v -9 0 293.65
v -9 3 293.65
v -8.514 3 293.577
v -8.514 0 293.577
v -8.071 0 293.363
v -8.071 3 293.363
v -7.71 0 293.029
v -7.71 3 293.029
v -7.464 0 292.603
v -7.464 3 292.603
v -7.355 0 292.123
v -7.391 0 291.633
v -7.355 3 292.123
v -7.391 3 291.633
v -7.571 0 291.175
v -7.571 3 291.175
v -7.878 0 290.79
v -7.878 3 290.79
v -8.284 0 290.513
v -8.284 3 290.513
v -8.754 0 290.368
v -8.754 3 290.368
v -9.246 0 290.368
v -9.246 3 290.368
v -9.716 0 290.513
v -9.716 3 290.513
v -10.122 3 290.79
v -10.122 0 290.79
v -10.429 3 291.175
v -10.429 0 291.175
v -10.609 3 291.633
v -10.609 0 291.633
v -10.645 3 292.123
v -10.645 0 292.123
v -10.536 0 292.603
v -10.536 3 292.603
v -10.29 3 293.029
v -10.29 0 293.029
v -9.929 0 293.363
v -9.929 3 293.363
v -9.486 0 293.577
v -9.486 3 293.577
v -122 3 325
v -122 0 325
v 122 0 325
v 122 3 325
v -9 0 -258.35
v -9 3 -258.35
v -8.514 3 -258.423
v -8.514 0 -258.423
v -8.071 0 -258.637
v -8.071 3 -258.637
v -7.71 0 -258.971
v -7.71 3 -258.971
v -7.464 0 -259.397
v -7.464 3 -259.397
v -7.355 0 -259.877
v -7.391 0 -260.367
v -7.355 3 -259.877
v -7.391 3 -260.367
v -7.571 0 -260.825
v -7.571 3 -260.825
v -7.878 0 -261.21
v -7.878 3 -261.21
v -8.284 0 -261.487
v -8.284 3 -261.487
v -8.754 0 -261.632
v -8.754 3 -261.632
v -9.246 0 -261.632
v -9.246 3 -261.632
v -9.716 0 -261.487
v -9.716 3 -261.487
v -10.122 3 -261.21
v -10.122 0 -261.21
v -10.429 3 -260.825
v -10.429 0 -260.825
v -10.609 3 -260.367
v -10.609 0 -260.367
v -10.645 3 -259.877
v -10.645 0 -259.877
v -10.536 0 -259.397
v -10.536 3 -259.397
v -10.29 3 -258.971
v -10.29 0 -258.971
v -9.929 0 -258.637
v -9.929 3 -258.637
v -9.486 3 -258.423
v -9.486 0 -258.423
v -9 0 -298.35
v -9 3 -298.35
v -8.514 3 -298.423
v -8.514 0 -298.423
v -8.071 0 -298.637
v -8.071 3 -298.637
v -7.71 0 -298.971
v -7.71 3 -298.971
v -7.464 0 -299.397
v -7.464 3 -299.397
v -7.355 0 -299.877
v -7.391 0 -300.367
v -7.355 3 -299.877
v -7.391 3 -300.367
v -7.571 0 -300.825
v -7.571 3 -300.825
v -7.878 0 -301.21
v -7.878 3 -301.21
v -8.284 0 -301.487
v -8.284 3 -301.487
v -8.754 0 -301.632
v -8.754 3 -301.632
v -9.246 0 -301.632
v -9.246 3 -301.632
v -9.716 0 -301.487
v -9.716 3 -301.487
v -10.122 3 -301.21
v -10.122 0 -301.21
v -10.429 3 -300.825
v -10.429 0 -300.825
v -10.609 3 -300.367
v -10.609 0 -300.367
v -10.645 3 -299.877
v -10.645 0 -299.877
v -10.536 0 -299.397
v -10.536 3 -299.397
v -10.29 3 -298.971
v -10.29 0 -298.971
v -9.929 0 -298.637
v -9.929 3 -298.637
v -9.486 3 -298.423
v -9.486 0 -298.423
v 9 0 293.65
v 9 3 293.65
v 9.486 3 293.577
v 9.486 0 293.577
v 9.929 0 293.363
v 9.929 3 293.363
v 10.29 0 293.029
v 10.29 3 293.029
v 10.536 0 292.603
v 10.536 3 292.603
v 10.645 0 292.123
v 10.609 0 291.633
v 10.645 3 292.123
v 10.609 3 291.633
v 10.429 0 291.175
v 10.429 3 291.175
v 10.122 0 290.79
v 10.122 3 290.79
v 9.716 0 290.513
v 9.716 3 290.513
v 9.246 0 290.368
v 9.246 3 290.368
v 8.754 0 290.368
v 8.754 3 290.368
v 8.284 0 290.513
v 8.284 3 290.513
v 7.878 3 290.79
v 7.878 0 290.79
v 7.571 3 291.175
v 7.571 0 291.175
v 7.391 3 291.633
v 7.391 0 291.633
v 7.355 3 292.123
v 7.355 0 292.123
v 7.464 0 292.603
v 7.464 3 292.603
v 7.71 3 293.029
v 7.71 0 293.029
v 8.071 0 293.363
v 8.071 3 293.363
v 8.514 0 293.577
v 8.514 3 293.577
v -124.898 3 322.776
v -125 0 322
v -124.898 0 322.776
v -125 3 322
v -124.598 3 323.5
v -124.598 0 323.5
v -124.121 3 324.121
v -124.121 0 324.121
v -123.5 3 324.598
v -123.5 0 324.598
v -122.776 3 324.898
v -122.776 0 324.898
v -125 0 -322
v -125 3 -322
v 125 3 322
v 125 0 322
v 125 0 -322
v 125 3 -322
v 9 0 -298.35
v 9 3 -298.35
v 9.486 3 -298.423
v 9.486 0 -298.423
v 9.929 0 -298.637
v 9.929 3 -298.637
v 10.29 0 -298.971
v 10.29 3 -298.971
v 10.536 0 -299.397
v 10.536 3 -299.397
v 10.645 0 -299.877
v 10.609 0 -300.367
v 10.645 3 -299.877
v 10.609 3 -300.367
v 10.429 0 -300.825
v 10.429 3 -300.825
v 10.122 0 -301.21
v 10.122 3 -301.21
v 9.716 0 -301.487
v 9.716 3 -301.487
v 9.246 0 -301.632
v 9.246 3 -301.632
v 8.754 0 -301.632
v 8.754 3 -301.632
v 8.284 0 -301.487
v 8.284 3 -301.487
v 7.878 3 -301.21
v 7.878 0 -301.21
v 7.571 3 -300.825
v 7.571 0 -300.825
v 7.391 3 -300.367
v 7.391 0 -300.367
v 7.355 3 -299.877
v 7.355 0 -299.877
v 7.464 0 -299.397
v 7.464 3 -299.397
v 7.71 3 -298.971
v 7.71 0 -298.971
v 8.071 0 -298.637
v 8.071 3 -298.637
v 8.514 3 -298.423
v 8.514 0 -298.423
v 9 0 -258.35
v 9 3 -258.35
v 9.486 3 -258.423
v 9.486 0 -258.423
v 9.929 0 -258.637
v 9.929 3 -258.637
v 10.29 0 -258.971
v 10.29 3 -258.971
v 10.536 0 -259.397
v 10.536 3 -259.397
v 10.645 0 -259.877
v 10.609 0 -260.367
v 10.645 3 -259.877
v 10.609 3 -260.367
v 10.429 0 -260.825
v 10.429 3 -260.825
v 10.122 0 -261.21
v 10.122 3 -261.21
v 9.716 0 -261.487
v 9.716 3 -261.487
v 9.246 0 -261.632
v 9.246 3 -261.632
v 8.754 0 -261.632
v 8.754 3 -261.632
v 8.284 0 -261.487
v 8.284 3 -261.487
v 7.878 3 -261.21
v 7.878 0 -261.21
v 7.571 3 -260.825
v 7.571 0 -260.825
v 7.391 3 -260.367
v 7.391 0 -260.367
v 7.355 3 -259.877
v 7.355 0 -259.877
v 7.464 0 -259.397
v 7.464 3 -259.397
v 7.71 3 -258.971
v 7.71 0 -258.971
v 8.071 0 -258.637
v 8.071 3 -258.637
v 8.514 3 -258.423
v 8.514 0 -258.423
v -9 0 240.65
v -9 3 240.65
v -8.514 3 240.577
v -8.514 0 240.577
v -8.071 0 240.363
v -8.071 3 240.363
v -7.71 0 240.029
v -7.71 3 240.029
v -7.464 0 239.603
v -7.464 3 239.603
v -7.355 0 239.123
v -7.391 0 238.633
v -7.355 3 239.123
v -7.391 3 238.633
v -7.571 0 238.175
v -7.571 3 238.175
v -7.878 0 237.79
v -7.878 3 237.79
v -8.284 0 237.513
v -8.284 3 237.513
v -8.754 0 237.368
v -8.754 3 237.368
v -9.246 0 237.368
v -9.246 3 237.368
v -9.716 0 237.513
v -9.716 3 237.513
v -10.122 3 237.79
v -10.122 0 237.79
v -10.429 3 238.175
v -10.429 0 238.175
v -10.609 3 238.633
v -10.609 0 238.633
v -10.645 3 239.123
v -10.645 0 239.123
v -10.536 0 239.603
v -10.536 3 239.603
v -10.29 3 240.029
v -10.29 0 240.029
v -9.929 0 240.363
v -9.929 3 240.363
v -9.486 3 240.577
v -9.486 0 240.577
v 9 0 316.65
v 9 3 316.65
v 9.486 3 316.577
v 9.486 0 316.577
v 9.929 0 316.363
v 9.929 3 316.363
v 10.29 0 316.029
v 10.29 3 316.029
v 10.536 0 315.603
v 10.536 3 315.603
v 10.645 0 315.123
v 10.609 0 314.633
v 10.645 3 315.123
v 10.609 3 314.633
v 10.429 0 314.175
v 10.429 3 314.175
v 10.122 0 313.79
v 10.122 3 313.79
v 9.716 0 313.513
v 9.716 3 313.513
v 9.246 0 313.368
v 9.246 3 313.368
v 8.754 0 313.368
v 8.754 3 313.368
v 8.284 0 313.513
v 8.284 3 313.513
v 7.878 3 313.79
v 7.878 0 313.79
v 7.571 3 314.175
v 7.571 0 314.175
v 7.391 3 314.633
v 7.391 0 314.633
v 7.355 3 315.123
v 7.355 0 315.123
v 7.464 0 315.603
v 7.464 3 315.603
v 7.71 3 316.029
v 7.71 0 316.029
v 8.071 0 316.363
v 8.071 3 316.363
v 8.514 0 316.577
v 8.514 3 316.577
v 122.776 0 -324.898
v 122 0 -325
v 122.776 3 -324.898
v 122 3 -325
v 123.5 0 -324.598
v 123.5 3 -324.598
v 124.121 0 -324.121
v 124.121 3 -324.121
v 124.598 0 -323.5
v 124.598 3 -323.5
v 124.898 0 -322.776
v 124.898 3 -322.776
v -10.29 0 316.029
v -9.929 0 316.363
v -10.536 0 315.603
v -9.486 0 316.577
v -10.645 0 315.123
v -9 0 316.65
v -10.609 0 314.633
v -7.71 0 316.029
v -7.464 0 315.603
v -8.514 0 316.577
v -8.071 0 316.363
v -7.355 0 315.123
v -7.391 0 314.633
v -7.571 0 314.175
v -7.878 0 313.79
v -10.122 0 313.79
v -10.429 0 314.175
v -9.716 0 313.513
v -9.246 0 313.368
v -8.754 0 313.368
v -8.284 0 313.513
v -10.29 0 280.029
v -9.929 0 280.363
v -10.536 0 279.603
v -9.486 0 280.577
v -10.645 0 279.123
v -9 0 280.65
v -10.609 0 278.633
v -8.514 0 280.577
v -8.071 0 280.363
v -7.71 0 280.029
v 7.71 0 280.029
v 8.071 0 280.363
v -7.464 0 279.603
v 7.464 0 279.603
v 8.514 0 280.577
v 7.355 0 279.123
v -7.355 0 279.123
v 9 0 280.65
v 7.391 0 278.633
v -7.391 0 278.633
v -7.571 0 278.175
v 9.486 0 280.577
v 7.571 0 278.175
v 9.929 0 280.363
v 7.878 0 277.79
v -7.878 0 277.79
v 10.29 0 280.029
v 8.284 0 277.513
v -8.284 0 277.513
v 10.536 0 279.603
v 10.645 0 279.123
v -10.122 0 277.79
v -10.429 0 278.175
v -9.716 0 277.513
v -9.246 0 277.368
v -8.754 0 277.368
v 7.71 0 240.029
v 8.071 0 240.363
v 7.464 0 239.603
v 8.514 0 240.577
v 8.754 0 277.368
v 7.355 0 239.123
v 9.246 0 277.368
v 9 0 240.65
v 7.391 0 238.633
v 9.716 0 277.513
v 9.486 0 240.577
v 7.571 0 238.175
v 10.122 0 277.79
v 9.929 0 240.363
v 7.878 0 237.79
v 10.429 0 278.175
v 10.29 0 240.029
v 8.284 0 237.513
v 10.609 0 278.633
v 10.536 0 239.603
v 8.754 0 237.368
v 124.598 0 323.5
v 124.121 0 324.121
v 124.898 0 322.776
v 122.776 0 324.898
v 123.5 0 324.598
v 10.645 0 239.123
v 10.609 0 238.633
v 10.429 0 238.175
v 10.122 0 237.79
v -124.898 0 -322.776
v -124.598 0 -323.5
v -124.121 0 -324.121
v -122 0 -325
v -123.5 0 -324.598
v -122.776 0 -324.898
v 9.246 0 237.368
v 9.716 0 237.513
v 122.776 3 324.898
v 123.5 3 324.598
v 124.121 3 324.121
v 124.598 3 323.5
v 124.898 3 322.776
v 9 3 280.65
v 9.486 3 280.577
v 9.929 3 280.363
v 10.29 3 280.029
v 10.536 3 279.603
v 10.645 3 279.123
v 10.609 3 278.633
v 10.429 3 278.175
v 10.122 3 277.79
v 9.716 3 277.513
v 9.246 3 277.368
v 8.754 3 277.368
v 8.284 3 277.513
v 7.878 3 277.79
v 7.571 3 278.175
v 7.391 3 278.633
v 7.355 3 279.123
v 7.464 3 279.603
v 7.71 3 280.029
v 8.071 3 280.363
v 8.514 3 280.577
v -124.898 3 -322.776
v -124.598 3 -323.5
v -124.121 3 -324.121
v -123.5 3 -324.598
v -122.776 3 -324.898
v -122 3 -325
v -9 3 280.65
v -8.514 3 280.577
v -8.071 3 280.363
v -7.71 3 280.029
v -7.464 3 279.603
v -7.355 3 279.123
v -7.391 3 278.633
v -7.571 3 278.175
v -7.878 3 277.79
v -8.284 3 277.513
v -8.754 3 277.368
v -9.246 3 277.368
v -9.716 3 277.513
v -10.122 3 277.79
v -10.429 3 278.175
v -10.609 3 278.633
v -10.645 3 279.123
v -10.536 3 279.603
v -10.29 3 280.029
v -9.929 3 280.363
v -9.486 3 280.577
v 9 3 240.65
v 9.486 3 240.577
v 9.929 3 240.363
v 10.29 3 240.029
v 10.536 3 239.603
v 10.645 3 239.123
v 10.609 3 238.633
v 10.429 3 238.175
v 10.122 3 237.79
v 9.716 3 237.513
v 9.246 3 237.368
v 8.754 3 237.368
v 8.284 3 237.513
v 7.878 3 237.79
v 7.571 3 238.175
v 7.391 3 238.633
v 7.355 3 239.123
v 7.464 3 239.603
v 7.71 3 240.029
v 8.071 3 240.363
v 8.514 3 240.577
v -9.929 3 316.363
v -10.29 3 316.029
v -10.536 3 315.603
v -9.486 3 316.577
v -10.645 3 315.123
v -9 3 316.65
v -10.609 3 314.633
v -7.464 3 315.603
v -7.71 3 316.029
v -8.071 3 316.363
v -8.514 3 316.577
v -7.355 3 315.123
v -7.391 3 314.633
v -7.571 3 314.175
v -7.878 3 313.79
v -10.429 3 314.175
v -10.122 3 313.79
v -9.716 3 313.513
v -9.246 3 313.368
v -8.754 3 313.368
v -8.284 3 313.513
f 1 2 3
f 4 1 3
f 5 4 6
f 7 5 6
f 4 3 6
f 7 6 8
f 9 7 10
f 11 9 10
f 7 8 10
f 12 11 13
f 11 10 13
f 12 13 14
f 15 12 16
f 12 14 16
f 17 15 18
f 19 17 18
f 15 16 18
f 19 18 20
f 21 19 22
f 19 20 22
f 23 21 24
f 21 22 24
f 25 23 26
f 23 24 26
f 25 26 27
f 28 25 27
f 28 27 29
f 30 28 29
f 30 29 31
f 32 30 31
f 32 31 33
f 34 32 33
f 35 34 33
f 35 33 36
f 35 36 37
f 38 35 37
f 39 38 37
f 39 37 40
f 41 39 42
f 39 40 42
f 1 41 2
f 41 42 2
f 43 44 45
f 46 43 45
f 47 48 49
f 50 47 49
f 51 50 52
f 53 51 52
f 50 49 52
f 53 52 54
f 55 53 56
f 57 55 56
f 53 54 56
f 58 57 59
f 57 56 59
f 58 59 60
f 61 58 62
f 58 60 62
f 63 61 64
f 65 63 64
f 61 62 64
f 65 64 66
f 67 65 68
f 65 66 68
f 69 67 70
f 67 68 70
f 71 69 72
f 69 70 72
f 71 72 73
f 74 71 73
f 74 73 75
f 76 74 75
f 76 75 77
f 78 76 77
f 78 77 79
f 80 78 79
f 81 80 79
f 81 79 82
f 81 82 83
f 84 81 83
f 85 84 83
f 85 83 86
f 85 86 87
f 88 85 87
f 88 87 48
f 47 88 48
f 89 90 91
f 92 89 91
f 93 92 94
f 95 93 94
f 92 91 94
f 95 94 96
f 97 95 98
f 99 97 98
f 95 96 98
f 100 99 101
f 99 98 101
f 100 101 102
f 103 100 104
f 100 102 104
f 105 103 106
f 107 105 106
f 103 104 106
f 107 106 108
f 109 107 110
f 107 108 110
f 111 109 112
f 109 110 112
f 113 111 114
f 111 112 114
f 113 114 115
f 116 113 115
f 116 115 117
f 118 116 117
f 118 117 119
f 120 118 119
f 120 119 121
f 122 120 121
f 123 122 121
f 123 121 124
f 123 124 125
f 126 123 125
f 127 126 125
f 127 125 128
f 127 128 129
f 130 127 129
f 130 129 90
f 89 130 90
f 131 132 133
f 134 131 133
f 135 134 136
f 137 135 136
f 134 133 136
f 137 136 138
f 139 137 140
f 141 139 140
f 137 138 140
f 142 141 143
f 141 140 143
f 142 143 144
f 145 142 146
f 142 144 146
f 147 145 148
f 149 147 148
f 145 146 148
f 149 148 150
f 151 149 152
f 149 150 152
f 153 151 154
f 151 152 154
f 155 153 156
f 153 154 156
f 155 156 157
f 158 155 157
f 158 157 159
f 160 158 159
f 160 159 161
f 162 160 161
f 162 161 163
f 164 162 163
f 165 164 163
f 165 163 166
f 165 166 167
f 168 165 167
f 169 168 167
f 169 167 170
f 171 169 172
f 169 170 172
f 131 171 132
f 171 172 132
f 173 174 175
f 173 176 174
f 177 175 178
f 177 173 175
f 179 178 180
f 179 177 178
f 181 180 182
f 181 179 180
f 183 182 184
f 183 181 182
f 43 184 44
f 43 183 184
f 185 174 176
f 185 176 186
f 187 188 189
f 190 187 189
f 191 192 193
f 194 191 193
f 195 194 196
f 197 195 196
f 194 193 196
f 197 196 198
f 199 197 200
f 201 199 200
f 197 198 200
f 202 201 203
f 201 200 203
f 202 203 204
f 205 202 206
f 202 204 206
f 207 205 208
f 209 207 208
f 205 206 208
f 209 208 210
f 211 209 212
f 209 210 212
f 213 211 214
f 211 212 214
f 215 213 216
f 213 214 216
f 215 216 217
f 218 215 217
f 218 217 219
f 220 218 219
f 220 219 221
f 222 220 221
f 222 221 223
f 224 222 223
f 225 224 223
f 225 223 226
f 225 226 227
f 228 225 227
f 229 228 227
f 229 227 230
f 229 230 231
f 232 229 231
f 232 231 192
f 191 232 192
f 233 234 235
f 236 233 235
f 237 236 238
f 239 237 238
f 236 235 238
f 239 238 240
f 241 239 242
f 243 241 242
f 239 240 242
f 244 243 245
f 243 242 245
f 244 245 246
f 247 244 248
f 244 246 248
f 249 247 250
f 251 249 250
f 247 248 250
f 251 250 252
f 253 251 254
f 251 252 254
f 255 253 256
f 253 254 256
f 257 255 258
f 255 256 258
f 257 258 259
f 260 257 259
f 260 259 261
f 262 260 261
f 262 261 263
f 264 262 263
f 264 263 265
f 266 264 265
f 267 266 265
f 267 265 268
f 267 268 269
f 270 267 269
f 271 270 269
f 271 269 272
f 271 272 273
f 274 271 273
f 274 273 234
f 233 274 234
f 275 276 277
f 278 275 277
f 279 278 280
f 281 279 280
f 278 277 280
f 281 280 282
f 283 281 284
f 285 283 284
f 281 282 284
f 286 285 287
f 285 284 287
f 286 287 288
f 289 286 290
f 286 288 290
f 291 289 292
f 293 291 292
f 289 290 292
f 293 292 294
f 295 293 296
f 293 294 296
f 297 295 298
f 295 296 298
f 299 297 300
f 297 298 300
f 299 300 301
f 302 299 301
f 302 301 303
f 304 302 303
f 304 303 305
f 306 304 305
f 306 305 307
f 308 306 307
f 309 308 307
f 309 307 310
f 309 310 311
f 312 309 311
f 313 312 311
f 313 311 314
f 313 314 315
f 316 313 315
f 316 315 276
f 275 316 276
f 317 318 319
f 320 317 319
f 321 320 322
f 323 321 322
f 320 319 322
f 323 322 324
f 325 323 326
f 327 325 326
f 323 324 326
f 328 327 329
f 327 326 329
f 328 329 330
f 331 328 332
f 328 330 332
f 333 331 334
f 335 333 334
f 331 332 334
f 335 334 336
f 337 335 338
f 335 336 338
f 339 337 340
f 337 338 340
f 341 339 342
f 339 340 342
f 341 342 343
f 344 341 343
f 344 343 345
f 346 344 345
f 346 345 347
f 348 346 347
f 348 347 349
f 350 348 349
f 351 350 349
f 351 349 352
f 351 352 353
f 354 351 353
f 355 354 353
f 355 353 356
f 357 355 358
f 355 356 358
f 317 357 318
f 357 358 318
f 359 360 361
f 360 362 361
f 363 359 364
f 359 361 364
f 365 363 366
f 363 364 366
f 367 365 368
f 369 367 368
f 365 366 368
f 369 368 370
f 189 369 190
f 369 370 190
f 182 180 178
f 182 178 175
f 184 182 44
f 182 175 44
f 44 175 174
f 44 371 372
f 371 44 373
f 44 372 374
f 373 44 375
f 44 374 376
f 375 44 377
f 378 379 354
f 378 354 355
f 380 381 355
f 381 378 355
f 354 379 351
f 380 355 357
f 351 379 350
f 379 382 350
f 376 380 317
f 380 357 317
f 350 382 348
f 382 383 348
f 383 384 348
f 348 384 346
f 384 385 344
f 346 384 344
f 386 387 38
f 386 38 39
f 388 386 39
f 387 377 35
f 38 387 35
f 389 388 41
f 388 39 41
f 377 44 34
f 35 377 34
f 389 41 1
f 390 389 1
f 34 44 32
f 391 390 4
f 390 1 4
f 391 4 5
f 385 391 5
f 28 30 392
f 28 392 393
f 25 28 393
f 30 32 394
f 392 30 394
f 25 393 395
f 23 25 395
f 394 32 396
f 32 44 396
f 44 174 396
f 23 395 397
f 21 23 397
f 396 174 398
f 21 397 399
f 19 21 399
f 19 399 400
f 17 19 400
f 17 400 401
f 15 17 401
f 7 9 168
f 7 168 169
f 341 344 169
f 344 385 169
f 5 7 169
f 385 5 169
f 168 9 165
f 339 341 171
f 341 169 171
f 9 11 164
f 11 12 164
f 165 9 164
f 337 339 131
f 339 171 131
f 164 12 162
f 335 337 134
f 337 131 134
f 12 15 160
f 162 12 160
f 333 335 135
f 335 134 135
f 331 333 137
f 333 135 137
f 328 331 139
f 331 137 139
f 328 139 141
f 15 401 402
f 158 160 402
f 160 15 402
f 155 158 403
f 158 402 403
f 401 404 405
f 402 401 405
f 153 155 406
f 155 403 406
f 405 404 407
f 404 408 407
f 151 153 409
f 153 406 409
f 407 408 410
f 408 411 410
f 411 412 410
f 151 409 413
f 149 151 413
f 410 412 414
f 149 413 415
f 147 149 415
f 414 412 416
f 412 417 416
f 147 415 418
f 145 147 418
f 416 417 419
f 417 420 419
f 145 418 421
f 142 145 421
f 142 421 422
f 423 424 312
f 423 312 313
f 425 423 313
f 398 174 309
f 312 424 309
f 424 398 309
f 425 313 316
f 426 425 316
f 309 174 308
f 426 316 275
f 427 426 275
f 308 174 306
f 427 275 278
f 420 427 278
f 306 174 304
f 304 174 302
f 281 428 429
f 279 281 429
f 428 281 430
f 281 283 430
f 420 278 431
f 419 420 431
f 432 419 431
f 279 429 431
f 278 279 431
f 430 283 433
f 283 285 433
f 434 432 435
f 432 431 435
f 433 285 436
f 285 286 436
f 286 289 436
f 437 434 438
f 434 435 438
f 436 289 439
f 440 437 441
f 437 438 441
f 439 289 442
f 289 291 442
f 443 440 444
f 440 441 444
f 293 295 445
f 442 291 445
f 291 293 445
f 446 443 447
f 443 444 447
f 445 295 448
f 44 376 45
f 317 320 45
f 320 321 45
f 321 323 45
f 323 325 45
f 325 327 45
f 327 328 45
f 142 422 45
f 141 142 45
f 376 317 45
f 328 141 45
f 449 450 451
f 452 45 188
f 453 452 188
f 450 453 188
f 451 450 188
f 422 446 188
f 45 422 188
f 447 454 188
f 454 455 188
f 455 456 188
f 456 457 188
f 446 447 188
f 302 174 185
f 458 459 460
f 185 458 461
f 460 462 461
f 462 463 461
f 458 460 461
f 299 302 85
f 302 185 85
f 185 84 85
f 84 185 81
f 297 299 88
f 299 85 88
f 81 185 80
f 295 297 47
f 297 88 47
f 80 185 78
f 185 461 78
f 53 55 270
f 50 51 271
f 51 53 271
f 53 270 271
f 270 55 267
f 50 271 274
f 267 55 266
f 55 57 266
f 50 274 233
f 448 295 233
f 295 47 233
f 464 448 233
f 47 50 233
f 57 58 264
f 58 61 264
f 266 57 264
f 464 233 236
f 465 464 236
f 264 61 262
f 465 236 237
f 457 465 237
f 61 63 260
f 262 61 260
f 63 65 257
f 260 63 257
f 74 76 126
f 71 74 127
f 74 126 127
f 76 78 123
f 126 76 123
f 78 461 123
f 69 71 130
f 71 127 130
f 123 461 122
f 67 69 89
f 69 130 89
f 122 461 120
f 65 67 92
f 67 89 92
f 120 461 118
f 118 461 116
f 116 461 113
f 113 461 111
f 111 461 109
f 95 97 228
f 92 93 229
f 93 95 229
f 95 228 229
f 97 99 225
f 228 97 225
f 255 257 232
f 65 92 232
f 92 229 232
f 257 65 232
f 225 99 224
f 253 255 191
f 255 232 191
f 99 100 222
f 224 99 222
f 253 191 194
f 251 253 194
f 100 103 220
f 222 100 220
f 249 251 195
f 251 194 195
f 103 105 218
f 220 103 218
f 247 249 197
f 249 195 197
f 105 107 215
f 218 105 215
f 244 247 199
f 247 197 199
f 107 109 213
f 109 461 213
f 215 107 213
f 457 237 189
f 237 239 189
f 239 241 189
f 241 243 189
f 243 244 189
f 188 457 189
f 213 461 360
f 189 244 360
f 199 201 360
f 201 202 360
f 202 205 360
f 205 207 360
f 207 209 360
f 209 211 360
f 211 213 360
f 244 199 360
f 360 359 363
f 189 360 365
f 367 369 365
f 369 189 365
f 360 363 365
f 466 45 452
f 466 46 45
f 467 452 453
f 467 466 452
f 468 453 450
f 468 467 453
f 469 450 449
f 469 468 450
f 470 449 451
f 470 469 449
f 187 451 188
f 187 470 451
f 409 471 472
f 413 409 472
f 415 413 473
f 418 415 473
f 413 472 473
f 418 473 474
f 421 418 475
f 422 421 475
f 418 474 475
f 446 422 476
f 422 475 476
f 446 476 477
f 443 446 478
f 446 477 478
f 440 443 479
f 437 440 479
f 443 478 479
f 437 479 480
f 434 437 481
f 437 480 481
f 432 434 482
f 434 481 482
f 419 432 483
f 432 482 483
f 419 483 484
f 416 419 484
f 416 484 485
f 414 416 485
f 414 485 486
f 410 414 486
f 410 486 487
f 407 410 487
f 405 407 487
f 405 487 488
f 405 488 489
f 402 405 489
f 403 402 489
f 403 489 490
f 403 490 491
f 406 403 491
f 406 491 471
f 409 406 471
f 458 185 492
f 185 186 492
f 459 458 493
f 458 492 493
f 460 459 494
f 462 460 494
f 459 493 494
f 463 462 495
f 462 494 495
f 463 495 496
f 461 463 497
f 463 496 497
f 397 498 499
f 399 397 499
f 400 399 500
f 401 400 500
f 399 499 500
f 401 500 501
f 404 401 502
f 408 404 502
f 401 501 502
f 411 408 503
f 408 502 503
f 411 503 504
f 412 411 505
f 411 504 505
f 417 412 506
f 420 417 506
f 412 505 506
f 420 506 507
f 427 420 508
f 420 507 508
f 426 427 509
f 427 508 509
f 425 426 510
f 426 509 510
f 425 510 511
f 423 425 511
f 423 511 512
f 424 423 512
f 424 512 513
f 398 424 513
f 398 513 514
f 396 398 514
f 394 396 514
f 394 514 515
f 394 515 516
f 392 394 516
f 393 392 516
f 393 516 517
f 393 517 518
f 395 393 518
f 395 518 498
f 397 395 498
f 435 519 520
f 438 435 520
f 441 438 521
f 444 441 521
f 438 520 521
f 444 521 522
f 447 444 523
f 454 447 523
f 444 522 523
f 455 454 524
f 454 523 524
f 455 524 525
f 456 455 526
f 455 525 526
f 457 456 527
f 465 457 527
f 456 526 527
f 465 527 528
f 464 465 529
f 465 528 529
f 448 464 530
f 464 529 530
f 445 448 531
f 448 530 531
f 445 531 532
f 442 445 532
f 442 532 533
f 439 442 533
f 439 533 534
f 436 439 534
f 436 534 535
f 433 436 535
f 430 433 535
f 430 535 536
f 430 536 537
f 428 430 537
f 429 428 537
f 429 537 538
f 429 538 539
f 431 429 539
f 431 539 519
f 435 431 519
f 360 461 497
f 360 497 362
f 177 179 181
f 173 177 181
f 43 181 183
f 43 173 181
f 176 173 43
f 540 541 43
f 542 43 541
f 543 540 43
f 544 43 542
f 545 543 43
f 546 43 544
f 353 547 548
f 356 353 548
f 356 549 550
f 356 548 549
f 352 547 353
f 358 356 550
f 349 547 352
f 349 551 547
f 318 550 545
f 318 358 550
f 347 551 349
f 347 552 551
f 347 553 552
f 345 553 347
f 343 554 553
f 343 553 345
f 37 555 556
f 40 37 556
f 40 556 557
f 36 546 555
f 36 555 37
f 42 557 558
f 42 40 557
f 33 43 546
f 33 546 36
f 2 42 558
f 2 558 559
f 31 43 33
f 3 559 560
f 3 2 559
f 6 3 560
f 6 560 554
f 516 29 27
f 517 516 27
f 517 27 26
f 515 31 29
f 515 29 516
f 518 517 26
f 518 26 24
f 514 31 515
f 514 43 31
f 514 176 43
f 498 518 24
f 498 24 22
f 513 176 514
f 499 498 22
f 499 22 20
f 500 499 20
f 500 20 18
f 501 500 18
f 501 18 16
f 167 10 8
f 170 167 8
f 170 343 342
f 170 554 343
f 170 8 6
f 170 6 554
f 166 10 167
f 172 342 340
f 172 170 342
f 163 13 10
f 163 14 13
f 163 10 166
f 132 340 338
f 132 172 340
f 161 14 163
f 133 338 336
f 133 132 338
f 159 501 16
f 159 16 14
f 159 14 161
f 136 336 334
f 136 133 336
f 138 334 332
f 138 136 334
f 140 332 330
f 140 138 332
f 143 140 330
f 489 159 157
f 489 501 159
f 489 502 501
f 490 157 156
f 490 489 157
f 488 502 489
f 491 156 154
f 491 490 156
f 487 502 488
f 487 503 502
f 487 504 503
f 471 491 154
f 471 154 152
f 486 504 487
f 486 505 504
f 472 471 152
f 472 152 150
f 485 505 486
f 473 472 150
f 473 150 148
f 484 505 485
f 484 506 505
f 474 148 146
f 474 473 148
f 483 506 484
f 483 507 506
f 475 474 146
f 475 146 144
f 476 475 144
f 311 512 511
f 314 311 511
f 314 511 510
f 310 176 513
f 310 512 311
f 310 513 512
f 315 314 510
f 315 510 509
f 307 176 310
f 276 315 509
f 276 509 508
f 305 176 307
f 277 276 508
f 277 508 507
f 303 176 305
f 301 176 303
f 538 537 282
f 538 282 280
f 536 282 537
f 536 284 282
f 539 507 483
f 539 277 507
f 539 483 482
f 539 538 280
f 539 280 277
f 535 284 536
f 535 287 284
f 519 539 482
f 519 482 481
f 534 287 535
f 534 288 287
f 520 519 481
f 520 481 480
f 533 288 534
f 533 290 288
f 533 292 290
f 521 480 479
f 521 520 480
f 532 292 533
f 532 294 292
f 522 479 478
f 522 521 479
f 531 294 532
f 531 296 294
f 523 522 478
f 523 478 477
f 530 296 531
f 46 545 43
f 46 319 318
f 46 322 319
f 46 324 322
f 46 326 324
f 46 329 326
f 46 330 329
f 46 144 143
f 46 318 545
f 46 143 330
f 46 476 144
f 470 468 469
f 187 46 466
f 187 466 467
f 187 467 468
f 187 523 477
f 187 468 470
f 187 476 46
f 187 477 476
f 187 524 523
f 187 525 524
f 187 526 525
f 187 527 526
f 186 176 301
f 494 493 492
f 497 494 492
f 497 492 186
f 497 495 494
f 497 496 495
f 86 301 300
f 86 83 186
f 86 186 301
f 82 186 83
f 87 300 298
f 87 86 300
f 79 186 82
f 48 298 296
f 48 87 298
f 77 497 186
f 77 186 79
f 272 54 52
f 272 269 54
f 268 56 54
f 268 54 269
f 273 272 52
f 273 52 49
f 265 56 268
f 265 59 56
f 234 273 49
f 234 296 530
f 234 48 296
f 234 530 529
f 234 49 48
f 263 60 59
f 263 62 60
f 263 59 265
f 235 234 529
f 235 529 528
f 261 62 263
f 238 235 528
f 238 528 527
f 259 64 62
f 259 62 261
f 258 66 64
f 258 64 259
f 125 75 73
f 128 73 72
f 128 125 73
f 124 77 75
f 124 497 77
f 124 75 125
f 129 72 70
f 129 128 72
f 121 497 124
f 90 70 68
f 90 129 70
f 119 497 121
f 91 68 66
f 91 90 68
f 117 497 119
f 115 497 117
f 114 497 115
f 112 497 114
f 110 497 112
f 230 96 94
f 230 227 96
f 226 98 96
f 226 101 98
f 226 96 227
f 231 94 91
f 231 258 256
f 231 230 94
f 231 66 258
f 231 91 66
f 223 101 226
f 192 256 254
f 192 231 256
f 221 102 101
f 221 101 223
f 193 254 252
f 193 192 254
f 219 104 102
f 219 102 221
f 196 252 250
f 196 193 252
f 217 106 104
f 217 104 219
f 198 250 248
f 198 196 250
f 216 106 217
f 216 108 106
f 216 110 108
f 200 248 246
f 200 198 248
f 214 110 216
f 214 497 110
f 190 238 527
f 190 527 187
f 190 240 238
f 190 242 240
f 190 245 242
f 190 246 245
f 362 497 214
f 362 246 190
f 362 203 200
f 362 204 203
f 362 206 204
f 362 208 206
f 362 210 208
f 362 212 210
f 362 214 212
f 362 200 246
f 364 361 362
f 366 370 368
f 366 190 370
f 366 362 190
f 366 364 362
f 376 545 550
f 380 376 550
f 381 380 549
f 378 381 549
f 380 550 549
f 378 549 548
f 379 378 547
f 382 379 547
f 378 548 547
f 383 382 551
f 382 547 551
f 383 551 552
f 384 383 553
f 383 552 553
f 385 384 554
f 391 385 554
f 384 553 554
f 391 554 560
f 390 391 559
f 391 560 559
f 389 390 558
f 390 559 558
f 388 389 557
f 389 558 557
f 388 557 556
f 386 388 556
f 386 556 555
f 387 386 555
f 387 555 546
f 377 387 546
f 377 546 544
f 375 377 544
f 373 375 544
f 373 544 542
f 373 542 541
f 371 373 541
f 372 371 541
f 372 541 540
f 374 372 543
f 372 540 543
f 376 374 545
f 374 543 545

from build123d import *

# Parameters (mm, degrees)
SKETCH_1_W          = 250
SKETCH_1_H          = 650
EXTRUDE_1_DEPTH     = 3
SKETCH_3_R          = 1.65
CUT_EXTRUDE_2_DEPTH = 10
SKETCH_4_R          = 1.65
CUT_EXTRUDE_3_DEPTH = 3
FILLET_1_R          = 3


with BuildPart() as part:
    # 草图1 → 凸台-拉伸1 (new body)
    with BuildSketch(Plane(origin=(0, 0, 0), x_dir=(1, 0, 0), z_dir=(0, 1, 0))):
        Rectangle(SKETCH_1_W, SKETCH_1_H)
    extrude(amount=EXTRUDE_1_DEPTH)

    # 草图3 → 切除-拉伸2 (cut)
    with BuildSketch(Plane(origin=(0, 3, 0), x_dir=(1, 0, 0), z_dir=(0, 1, 0))):
        with Locations(Location((9, -279, 0), (0, 0, 270))):
            Circle(SKETCH_3_R)
        with Locations(Location((-9, -279, 0), (0, 0, 270))):
            Circle(SKETCH_3_R)
        with Locations(Location((9, -239, 0), (0, 0, 270))):
            Circle(SKETCH_3_R)
        with Locations(Location((-9, -239, 0), (0, 0, 270))):
            Circle(SKETCH_3_R)
        with Locations(Location((9, 300, 0), (0, 0, 270))):
            Circle(SKETCH_3_R)
        with Locations(Location((-9, 300, 0), (0, 0, 270))):
            Circle(SKETCH_3_R)
        with Locations(Location((9, 260, 0), (0, 0, 270))):
            Circle(SKETCH_3_R)
        with Locations(Location((-9, 260, 0), (0, 0, 270))):
            Circle(SKETCH_3_R)
    extrude(amount=-CUT_EXTRUDE_2_DEPTH, mode=Mode.SUBTRACT)

    # 草图4 → 切除-拉伸3 (cut)
    with BuildSketch(Plane(origin=(0, 3, 0), x_dir=(1, 0, 0), z_dir=(0, 1, 0))):
        with Locations(Location((9, -292, 0), (0, 0, 270))):
            Circle(SKETCH_4_R)
        with Locations(Location((-9, -292, 0), (0, 0, 270))):
            Circle(SKETCH_4_R)
        with Locations(Location((-9, -315, 0), (0, 0, 270))):
            Circle(SKETCH_4_R)
        with Locations(Location((9, -315, 0), (0, 0, 270))):
            Circle(SKETCH_4_R)
    extrude(amount=-CUT_EXTRUDE_3_DEPTH, mode=Mode.SUBTRACT)

    # 圆角1
    fillet_1_edges = [part.edges().sort_by_distance(p)[0] for p in [
        (125, 1.5, 325),
        (-125, 1.5, 325),
        (-125, 1.5, -325),
        (125, 1.5, -325),
    ]]
    fillet(fillet_1_edges, radius=FILLET_1_R)


solid = part.part
